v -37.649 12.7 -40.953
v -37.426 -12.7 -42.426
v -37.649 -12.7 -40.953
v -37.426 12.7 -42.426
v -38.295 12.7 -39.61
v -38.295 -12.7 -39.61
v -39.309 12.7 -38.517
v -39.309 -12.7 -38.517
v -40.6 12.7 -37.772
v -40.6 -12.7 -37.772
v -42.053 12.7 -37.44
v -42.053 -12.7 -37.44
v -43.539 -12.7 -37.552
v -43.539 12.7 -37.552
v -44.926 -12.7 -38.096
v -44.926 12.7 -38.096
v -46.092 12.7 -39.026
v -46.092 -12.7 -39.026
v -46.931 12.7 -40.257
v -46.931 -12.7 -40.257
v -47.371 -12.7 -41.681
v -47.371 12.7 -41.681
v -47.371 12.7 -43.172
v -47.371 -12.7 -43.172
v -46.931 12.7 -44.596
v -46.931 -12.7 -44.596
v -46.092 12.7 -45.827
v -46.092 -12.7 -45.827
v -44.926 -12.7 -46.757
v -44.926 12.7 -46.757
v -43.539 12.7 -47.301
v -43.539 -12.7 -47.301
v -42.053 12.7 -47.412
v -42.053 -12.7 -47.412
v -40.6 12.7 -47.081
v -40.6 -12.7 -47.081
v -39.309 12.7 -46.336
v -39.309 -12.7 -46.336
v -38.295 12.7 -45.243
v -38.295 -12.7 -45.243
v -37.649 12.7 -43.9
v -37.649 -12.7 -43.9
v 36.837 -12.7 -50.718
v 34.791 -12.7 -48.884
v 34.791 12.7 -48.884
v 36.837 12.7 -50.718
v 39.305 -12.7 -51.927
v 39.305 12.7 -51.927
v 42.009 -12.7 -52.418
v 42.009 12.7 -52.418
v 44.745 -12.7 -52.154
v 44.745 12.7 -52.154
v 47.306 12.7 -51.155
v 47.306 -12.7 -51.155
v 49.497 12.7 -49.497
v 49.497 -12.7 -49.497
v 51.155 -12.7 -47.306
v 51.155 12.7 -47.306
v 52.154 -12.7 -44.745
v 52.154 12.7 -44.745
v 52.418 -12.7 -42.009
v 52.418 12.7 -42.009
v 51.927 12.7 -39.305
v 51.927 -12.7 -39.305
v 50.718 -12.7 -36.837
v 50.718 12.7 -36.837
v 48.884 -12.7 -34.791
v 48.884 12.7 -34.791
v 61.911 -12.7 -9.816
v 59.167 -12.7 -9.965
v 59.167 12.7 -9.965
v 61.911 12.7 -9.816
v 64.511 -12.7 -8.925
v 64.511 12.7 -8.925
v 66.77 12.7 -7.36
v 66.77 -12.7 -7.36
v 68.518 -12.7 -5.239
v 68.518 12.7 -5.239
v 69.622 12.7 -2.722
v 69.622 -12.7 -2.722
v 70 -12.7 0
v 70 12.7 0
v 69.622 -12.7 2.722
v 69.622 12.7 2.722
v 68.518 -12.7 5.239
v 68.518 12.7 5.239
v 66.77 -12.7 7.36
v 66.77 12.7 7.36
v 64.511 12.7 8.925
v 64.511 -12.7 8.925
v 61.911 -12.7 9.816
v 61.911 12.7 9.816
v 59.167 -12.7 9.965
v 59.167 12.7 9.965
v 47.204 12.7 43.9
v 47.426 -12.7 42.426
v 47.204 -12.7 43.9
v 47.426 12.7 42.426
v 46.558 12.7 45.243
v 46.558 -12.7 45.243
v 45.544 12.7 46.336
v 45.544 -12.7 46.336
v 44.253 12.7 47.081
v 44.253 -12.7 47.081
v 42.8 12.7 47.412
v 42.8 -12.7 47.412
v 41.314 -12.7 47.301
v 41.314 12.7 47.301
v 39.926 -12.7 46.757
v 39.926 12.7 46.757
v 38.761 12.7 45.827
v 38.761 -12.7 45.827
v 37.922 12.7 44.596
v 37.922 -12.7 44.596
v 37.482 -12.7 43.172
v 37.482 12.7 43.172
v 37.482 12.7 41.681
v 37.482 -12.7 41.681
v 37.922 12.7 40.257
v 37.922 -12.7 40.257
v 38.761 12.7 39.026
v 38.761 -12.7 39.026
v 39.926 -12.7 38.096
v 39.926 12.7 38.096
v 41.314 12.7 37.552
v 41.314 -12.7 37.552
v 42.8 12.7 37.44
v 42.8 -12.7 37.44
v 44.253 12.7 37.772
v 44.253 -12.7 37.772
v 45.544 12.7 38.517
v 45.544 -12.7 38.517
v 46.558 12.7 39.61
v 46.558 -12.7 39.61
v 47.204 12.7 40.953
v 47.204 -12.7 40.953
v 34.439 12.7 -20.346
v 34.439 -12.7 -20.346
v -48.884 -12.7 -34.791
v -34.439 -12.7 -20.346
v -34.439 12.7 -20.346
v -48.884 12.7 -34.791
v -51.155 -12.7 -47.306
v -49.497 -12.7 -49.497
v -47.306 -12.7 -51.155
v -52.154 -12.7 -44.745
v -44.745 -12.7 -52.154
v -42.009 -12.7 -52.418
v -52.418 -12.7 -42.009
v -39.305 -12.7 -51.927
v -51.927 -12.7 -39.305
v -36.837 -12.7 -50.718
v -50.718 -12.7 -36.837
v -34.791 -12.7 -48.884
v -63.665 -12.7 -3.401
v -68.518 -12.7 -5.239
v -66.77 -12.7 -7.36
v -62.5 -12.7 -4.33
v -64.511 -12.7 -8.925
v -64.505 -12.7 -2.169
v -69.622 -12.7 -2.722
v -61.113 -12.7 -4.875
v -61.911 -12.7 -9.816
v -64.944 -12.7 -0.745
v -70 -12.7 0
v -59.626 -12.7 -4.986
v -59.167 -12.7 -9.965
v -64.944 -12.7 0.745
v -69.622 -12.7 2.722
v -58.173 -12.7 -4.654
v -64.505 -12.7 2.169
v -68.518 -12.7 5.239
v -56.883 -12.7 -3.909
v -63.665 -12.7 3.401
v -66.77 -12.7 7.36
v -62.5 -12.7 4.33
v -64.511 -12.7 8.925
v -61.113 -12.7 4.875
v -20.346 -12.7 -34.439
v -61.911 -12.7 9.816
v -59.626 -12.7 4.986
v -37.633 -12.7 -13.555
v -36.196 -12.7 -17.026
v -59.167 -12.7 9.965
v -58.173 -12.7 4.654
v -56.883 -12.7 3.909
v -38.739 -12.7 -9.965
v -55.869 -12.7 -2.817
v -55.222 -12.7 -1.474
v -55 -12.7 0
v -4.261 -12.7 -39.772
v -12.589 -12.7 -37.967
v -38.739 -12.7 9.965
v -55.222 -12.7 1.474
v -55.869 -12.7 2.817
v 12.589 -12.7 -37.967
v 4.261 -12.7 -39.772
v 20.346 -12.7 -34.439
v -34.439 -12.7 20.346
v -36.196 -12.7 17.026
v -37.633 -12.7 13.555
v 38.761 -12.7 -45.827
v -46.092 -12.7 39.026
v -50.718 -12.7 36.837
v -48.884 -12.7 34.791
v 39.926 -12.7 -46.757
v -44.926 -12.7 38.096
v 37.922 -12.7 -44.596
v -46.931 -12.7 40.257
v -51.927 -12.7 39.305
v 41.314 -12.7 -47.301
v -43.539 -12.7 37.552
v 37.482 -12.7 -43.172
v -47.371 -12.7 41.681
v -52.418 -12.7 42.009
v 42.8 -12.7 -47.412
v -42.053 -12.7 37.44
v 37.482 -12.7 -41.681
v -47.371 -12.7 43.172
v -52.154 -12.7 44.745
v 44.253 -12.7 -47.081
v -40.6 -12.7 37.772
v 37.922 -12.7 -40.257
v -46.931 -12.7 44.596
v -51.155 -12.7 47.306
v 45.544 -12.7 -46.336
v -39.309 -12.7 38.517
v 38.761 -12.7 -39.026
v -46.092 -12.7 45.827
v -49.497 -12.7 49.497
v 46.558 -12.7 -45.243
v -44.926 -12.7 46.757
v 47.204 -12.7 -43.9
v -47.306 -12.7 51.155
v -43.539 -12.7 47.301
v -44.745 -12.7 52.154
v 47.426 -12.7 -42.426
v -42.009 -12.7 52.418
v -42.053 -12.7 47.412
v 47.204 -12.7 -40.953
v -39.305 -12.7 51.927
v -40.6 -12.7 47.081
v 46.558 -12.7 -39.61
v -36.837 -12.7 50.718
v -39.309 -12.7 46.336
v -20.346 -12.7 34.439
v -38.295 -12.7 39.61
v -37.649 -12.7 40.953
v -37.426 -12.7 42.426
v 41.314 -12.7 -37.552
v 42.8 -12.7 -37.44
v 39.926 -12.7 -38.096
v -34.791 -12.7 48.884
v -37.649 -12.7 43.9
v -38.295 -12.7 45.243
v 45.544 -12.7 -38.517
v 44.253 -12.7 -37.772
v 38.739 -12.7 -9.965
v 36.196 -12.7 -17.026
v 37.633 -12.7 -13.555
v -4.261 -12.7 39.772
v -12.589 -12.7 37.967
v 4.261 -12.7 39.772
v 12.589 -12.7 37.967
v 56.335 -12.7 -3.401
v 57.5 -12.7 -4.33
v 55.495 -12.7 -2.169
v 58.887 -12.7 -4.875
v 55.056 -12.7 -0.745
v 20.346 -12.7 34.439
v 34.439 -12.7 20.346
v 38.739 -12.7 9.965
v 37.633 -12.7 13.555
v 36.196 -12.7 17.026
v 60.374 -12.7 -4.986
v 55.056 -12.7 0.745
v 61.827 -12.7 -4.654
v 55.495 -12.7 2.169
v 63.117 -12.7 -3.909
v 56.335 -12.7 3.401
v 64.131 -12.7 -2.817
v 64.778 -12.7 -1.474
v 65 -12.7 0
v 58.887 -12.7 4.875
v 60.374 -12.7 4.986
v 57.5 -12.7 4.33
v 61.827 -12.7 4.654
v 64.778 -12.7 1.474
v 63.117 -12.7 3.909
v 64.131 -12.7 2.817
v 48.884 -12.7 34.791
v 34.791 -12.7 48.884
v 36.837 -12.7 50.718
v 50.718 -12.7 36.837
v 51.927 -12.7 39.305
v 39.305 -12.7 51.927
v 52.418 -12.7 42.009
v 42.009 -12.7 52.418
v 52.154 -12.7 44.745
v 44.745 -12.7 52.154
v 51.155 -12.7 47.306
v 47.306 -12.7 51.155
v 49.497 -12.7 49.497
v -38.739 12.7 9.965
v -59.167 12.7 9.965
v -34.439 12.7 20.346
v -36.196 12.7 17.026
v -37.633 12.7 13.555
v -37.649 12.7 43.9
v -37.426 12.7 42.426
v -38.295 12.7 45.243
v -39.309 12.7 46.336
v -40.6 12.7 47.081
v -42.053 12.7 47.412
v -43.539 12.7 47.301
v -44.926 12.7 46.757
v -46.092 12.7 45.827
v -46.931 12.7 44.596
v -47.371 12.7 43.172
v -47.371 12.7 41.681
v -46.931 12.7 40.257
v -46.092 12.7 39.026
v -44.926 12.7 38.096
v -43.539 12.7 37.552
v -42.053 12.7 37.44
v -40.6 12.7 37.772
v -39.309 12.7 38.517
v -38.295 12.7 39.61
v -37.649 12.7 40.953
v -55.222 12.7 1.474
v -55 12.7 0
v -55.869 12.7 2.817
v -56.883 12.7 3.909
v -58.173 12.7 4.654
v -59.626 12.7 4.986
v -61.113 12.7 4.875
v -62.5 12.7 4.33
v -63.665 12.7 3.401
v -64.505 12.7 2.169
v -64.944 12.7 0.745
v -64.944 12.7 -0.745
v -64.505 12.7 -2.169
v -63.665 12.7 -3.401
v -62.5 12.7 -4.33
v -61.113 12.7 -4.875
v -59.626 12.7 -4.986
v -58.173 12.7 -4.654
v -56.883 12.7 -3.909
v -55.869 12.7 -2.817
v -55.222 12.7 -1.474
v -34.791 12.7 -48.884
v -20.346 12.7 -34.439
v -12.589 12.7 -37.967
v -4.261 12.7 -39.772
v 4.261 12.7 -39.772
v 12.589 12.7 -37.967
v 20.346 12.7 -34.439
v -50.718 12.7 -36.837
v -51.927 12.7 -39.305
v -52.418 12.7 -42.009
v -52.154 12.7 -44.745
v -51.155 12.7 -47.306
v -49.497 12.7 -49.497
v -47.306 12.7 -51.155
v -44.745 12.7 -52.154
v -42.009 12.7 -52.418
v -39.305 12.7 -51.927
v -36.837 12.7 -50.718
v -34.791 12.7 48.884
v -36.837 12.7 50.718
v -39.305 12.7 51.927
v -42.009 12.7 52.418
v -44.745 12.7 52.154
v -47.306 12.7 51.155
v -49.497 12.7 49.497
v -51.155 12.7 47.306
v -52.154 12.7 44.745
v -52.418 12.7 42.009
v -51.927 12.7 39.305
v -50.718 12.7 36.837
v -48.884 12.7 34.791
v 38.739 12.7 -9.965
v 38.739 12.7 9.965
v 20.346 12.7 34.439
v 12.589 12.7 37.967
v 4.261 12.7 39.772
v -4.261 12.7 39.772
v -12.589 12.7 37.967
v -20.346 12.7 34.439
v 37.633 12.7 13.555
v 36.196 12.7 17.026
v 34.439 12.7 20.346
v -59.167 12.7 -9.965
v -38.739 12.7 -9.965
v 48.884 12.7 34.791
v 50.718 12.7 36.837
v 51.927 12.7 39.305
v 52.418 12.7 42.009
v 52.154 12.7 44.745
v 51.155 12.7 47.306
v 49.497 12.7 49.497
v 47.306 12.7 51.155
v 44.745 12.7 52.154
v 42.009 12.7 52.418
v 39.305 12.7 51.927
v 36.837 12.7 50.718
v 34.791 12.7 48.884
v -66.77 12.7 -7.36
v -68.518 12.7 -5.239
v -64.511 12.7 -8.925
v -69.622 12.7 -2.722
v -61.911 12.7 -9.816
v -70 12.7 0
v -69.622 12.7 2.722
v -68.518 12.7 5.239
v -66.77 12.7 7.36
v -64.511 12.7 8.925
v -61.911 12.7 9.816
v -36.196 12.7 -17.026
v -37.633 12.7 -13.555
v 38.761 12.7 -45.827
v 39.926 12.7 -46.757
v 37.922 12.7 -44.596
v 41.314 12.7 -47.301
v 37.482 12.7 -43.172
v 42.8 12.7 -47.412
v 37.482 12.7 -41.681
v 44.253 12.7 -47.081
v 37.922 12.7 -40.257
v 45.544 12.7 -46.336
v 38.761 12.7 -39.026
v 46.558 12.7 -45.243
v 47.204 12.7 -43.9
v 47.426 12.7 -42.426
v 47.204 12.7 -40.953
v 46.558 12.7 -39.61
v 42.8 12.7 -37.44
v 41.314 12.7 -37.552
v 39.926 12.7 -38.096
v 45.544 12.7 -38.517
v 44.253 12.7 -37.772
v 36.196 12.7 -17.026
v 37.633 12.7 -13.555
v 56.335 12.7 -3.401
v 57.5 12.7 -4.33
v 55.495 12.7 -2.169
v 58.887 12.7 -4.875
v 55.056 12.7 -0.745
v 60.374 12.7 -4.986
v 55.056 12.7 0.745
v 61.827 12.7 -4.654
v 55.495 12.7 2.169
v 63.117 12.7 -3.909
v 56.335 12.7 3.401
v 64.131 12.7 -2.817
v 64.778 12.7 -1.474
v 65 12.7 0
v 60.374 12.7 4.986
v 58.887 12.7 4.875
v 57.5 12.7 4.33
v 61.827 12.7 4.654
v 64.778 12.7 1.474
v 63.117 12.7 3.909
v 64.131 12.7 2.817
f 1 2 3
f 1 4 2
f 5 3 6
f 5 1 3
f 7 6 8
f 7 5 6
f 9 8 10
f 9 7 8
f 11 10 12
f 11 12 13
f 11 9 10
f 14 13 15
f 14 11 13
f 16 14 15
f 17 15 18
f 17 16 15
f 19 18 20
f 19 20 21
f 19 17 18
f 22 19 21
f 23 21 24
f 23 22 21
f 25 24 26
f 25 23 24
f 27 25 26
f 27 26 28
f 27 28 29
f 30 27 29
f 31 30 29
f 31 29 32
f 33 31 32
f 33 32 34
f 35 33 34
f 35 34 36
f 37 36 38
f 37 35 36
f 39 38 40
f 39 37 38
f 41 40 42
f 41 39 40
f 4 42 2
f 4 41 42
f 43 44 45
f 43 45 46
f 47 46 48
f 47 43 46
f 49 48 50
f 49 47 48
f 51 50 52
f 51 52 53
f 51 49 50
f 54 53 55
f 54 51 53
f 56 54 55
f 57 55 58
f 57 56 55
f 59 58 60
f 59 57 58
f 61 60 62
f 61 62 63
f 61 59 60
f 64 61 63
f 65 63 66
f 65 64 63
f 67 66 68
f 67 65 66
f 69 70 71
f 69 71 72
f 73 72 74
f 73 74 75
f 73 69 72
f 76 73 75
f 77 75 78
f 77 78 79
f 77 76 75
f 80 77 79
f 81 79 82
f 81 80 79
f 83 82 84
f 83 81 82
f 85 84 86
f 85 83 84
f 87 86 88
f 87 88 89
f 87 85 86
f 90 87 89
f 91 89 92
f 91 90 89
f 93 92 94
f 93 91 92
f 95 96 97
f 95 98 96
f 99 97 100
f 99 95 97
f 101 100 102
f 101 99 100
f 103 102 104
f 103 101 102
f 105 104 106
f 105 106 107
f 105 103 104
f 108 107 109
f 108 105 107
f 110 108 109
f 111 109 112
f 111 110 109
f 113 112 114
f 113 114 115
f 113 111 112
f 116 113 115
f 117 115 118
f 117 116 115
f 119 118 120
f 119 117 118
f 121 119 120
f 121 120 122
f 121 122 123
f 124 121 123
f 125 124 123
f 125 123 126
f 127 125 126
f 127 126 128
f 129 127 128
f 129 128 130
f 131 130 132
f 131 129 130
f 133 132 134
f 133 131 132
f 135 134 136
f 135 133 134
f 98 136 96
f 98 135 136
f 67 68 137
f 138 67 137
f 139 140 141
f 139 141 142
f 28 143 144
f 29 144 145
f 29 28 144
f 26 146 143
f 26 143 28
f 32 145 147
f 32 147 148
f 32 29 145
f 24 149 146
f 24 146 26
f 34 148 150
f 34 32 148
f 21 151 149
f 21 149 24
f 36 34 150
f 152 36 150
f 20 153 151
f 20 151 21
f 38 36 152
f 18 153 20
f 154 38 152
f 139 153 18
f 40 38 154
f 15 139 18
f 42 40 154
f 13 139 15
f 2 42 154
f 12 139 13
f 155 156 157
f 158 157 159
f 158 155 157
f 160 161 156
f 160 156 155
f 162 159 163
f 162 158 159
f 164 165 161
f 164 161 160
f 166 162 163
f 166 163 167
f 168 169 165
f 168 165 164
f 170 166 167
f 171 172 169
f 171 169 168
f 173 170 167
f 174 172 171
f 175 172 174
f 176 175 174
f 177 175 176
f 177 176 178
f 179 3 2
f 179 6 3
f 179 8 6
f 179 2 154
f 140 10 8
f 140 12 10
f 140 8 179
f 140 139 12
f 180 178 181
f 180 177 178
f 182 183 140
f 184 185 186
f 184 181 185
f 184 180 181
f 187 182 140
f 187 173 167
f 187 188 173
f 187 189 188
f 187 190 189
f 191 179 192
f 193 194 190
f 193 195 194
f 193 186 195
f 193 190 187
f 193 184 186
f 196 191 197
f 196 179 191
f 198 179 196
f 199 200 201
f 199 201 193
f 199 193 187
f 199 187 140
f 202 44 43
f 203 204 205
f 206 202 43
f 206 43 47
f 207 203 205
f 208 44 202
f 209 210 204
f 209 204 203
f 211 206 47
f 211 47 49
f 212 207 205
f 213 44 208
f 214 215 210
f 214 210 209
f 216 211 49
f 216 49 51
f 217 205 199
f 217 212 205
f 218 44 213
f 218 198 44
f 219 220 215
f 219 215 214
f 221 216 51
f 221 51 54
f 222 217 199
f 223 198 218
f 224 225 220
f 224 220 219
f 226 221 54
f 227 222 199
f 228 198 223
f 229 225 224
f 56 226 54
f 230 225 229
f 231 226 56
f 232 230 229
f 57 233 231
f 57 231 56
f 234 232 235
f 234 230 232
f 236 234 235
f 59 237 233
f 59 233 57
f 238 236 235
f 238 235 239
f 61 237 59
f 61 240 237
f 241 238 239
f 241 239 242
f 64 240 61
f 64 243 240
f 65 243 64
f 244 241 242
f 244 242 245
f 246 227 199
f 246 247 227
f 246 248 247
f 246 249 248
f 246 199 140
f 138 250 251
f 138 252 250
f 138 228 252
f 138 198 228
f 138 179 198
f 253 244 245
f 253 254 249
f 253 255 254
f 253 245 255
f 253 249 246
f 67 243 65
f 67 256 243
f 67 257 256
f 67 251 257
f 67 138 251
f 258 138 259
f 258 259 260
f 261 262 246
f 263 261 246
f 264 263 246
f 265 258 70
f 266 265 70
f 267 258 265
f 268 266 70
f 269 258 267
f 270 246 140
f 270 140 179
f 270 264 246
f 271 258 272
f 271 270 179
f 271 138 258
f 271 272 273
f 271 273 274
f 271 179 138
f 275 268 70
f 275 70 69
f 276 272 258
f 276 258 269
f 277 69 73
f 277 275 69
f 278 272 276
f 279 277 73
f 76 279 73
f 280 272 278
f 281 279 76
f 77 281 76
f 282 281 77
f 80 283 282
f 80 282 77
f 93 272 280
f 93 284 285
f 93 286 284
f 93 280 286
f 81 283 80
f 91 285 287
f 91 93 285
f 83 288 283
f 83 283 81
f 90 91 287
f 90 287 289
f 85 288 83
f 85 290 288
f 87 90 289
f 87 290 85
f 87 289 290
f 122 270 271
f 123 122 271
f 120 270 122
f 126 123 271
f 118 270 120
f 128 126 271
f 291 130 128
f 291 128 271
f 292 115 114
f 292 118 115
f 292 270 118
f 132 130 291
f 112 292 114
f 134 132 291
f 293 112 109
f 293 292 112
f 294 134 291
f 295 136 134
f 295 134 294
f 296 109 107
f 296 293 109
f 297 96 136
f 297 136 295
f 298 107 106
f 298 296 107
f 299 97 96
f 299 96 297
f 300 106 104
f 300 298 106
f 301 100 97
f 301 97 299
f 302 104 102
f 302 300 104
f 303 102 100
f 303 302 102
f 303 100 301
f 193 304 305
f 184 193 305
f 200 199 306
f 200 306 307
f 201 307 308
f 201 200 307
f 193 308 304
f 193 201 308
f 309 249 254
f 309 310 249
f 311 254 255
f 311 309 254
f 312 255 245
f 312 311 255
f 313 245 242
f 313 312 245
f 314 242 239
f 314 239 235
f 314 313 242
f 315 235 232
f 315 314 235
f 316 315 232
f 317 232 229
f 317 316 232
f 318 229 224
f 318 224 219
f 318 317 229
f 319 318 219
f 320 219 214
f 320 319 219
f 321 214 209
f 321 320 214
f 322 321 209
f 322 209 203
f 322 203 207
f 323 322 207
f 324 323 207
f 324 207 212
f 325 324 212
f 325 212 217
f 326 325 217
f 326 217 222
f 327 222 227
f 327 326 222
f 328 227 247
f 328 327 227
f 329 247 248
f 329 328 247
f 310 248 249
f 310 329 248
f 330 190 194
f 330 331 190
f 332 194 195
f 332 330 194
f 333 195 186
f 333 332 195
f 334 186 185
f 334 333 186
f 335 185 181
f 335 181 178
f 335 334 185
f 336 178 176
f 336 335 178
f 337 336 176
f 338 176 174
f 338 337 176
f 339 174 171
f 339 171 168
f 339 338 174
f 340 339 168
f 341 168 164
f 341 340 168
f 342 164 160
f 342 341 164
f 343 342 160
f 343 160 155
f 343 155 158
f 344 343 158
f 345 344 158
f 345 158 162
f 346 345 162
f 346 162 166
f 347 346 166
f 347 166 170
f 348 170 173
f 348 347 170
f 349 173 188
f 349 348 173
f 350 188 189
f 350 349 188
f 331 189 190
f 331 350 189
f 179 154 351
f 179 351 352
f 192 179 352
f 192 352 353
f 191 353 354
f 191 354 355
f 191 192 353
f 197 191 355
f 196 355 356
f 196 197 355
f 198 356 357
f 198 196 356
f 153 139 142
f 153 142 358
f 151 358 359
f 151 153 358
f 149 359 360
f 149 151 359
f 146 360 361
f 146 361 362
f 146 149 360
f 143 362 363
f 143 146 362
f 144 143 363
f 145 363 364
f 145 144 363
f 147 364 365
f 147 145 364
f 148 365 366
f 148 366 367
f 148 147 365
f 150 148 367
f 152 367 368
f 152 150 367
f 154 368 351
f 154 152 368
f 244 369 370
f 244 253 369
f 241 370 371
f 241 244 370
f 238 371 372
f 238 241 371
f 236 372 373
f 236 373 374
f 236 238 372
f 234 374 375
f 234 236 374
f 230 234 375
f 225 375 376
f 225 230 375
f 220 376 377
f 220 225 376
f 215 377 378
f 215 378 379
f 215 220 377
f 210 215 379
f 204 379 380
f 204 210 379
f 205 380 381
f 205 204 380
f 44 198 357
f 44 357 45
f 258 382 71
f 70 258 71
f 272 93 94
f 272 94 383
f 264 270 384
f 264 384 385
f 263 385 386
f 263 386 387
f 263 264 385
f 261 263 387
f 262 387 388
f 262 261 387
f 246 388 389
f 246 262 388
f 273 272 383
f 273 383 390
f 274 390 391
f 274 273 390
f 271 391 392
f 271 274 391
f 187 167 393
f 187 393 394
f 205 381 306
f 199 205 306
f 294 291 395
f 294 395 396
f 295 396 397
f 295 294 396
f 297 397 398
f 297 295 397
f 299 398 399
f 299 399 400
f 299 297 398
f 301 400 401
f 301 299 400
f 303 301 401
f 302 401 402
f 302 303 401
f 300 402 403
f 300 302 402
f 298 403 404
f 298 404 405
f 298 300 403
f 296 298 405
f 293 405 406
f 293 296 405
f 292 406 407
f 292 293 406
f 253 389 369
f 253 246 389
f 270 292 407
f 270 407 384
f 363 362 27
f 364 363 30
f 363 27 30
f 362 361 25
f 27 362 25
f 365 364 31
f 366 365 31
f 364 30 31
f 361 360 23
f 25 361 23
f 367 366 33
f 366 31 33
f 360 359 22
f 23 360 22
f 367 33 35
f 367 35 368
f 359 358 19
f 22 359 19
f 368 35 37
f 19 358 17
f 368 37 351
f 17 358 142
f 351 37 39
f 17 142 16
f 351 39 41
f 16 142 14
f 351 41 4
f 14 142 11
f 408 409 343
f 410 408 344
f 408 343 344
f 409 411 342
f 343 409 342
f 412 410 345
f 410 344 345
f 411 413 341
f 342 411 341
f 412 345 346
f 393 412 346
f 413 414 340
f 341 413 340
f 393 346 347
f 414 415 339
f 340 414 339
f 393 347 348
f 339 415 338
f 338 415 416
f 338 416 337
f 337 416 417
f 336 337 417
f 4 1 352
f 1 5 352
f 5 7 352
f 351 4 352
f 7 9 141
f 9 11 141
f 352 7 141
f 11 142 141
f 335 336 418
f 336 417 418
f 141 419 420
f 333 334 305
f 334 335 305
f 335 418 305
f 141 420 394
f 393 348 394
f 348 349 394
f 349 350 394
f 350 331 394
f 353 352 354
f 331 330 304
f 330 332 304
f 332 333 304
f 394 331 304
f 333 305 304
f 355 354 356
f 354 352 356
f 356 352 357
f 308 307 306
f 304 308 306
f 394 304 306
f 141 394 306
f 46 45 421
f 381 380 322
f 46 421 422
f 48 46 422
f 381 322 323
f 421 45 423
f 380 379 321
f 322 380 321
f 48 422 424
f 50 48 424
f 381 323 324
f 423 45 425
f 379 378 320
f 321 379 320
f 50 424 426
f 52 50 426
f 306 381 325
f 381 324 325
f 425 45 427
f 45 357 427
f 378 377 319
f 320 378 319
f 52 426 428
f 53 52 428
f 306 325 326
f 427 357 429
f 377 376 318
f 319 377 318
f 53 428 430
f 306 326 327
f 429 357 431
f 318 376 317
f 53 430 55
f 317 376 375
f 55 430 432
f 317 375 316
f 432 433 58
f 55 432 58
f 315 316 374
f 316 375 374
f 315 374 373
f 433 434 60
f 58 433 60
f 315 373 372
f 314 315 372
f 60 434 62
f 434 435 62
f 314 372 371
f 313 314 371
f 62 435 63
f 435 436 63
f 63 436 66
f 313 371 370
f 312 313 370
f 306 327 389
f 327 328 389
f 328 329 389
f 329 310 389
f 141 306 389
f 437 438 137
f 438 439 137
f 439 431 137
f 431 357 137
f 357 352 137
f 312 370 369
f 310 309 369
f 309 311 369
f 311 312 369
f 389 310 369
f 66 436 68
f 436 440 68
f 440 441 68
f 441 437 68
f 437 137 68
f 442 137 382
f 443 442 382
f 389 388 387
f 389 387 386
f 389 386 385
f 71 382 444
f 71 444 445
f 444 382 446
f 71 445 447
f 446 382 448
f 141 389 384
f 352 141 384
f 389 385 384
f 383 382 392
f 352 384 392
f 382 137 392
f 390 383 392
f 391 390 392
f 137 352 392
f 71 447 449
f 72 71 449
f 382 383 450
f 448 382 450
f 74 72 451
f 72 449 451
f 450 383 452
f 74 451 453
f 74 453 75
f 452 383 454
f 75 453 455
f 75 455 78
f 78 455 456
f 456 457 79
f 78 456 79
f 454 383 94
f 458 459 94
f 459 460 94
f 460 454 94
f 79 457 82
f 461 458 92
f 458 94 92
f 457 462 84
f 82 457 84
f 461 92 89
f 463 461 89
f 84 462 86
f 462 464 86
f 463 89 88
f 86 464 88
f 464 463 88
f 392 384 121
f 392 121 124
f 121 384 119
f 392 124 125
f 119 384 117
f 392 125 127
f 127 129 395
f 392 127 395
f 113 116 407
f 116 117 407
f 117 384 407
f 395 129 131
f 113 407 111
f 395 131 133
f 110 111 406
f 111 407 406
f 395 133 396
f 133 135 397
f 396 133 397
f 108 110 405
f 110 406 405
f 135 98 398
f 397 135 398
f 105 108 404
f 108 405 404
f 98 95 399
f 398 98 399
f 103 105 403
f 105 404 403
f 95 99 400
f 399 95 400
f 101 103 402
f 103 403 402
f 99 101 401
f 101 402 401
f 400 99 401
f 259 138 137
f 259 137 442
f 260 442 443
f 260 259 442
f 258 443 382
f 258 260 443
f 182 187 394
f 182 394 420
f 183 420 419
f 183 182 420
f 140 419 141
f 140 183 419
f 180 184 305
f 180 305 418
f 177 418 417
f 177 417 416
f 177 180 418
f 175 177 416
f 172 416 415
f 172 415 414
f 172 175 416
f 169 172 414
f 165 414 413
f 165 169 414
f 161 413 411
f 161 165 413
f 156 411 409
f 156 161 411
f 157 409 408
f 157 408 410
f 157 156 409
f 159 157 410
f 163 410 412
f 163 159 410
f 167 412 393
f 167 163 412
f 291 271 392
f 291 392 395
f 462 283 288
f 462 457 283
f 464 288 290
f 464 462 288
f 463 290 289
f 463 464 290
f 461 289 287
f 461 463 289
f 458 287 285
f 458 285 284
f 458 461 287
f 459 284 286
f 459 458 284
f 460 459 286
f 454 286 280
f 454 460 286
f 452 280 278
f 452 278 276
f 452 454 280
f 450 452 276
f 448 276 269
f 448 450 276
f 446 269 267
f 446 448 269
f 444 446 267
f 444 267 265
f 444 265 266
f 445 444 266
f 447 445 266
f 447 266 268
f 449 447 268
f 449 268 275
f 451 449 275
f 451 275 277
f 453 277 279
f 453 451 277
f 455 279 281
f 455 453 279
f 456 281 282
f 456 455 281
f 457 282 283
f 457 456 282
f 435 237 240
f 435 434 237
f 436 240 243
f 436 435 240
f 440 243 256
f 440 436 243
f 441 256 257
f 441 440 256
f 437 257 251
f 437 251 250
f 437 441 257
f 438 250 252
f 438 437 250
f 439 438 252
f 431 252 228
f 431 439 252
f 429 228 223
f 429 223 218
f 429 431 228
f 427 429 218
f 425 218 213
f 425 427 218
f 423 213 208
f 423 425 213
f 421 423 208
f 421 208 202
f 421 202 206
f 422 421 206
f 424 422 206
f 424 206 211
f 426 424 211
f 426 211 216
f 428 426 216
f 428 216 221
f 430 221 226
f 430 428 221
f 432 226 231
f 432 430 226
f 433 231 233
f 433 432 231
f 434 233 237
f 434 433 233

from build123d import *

# Parameters (mm, degrees)
F0_R     = 5
F0_R_2   = 30
F1_DEPTH = 12.7


with BuildPart() as f1:
    # F0 (on Front) → F1 (new body, symmetric)
    with BuildSketch(Plane.XZ):
        with BuildLine():
            Line((-48.8836239391, 34.7906785013), (-34.438939242, 20.3459938043))
            ThreePointArc((-34.438939242, 20.3459938043), (-36.9551813005, 15.3073372946), (-38.7387976639, 9.9652172859))
            Line((-38.7387976639, 9.9652172859), (-59.1666666667, 9.9652172859))
            ThreePointArc((-59.1666666667, 9.9652172859), (-70, 0), (-59.1666666667, -9.9652172859))
            Line((-59.1666666667, -9.9652172859), (-38.7387976639, -9.9652172859))
            ThreePointArc((-38.7387976639, -9.9652172859), (-36.9551813005, -15.3073372946), (-34.438939242, -20.3459938043))
            Line((-34.438939242, -20.3459938043), (-48.8836239391, -34.7906785013))
            ThreePointArc((-48.8836239391, -34.7906785013), (-49.4974746831, -49.4974746831), (-34.7906785013, -48.8836239391))
            Line((-34.7906785013, -48.8836239391), (-20.3459938043, -34.438939242))
            ThreePointArc((-20.3459938043, -34.438939242), (0, -40), (20.3459938043, -34.438939242))
            Line((20.3459938043, -34.438939242), (34.7906785013, -48.8836239391))
            ThreePointArc((34.7906785013, -48.8836239391), (49.4974746831, -49.4974746831), (48.8836239391, -34.7906785013))
            Line((48.8836239391, -34.7906785013), (34.438939242, -20.3459938043))
            ThreePointArc((34.438939242, -20.3459938043), (36.9551813005, -15.3073372946), (38.7387976639, -9.9652172859))
            Line((38.7387976639, -9.9652172859), (59.1666666667, -9.9652172859))
            ThreePointArc((59.1666666667, -9.9652172859), (70, 0), (59.1666666667, 9.9652172859))
            Line((59.1666666667, 9.9652172859), (38.7387976639, 9.9652172859))
            ThreePointArc((38.7387976639, 9.9652172859), (36.9551813005, 15.3073372946), (34.438939242, 20.3459938043))
            Line((34.438939242, 20.3459938043), (48.8836239391, 34.7906785013))
            ThreePointArc((48.8836239391, 34.7906785013), (49.4974746831, 49.4974746831), (34.7906785013, 48.8836239391))
            Line((34.7906785013, 48.8836239391), (20.3459938043, 34.438939242))
            ThreePointArc((20.3459938043, 34.438939242), (0, 40), (-20.3459938043, 34.438939242))
            Line((-20.3459938043, 34.438939242), (-34.7906785013, 48.8836239391))
            ThreePointArc((-34.7906785013, 48.8836239391), (-49.4974746831, 49.4974746831), (-48.8836239391, 34.7906785013))
        make_face()
        with Locations((-42.4264068712, -42.4264068712)):
            Circle(F0_R, mode=Mode.SUBTRACT)
        with Locations((42.4264068712, -42.4264068712)):
            Circle(F0_R, mode=Mode.SUBTRACT)
        with Locations((-60, 0)):
            Circle(F0_R, mode=Mode.SUBTRACT)
        with Locations((-42.4264068712, 42.4264068712)):
            Circle(F0_R, mode=Mode.SUBTRACT)
        Circle(F0_R_2, mode=Mode.SUBTRACT)
        with Locations((60, 0)):
            Circle(F0_R, mode=Mode.SUBTRACT)
        with Locations((42.4264068712, 42.4264068712)):
            Circle(F0_R, mode=Mode.SUBTRACT)
        Circle(F0_R_2)
    extrude(amount=F1_DEPTH, both=True)


solid = f1.part
